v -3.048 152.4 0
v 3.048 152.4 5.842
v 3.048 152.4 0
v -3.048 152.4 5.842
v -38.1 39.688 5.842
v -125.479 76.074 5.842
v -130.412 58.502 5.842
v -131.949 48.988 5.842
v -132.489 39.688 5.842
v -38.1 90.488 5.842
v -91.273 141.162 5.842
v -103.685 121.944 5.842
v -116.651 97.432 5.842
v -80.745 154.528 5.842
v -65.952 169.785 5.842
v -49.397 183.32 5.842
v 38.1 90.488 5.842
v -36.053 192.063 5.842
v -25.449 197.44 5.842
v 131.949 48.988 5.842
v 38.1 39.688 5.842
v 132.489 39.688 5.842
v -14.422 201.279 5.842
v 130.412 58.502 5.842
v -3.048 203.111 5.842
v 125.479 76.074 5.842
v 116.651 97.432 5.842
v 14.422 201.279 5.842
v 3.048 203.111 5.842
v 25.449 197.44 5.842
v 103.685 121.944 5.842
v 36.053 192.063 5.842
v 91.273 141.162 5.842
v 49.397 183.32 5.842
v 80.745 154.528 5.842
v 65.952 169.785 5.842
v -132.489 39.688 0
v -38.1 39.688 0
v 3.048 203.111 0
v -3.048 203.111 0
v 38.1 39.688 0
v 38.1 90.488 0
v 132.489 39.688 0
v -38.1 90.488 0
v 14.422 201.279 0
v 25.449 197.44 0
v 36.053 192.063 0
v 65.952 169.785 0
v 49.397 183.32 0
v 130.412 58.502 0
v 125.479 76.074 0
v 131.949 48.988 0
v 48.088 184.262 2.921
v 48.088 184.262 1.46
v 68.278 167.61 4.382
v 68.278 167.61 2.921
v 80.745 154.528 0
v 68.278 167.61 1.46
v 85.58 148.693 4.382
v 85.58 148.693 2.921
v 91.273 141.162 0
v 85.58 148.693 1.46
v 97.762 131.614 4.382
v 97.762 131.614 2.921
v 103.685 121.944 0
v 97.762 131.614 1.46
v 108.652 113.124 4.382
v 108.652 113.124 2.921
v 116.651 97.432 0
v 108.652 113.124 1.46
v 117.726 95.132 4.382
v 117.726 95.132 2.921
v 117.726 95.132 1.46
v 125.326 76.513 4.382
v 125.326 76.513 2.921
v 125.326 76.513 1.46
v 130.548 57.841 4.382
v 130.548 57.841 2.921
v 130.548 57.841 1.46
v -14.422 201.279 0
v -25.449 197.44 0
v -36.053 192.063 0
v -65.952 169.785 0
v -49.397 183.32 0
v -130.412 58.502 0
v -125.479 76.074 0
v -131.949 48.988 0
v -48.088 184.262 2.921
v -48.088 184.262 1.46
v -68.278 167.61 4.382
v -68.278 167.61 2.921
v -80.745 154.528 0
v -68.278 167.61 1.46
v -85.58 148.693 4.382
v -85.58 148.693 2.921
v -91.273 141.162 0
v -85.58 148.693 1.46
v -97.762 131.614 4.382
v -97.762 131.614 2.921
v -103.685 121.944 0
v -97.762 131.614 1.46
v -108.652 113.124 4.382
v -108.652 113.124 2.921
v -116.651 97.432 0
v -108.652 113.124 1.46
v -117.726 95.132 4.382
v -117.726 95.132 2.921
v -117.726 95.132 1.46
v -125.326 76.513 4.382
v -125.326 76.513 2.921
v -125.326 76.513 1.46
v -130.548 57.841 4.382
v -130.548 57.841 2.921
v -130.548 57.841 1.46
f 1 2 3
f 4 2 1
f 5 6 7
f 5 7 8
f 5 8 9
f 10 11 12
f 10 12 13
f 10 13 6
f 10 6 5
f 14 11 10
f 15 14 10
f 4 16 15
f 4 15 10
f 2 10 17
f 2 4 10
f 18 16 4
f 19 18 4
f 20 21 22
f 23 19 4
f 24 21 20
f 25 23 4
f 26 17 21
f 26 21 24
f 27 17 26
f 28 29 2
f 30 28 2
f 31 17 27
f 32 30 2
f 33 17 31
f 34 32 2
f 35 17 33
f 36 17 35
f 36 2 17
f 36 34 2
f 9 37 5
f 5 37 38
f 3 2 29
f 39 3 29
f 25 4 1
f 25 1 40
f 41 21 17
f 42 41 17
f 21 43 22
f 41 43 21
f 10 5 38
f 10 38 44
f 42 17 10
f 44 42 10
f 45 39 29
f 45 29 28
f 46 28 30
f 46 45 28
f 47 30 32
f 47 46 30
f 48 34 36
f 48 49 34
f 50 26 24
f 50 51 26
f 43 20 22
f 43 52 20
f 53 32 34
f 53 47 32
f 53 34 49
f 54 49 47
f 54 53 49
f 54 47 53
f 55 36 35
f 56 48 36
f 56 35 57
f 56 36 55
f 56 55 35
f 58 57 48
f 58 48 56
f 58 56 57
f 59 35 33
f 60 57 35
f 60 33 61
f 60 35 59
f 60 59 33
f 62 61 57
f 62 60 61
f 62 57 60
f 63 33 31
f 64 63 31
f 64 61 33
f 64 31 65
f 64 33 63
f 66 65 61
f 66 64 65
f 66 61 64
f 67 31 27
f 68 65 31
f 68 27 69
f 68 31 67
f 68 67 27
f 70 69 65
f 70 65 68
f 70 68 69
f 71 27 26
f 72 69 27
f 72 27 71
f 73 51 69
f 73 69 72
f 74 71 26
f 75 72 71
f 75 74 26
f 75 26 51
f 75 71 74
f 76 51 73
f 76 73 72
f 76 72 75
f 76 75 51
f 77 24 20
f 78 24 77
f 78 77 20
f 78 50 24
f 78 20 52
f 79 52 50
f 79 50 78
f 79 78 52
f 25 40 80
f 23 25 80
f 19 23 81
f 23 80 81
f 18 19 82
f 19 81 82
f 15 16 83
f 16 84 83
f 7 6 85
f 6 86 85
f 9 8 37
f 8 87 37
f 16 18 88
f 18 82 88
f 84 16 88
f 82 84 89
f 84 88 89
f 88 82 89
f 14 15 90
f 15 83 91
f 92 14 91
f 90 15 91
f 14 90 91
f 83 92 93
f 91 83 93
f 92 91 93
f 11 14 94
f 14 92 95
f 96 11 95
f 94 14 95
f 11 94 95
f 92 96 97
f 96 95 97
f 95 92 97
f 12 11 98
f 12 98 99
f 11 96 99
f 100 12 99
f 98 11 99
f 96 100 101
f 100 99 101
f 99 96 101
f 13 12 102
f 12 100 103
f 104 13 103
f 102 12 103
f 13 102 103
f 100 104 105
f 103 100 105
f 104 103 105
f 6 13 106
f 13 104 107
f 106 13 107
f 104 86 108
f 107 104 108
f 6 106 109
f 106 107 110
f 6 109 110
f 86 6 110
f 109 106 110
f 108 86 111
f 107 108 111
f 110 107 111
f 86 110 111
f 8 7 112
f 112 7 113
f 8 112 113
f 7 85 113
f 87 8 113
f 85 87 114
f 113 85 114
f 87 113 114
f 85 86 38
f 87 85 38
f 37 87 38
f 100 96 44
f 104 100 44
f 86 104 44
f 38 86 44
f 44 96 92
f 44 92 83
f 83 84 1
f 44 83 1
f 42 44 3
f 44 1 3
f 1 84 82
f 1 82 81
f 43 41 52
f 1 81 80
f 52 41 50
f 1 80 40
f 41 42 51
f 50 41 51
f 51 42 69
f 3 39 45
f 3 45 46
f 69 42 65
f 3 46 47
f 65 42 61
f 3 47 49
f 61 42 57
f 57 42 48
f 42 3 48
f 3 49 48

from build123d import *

# Parameters (mm, degrees)
BOSS_EXTRUDE1_DEPTH = 5.842
SKETCH3_W           = 38.1
SKETCH3_H           = 50.8
SKETCH3_W_2         = 3.048
CUT_EXTRUDE1_DEPTH  = 243.64734842


with BuildPart() as part:
    # Sketch2 → Boss-Extrude1 (new body)
    with BuildSketch(Plane.XY):
        with BuildLine():
            Line((132.489119036, 39.6875), (0, 39.6875))
            Line((0, 39.6875), (0, 203.2))
            add(Edge.make_bspline(
                [(0, 203.2), (17.235406981, 203.2), (50.061159208, 185.921315787), (85.218169736, 152.2019324), (115.206186784, 104.366247761), (132.489119036, 63.290972919), (132.489119036, 39.6875)],
                knots=[0, 0, 0, 0, 0.231795721, 0.463575912, 0.653721915, 1, 1, 1, 1], degree=3))
        make_face()
    extrude(amount=BOSS_EXTRUDE1_DEPTH)

    # Sketch3 → Cut-Extrude1 (cut, through all)
    with BuildSketch(Plane.XY.offset(5.842)):
        with Locations((19.05, 65.0875)):
            Rectangle(SKETCH3_W, SKETCH3_H)
        with Locations((1.524, 177.8)):
            Rectangle(SKETCH3_W_2, SKETCH3_H)
    extrude(amount=-CUT_EXTRUDE1_DEPTH, mode=Mode.SUBTRACT)

    # Mirror1: part across plane


with BuildPart() as part_1:
    add(part.part)
    add(part.part.mirror(Plane(origin=(0, 0, 0), x_dir=(0, 0, 1), z_dir=(1, 0, 0))))


solid = part_1.part
